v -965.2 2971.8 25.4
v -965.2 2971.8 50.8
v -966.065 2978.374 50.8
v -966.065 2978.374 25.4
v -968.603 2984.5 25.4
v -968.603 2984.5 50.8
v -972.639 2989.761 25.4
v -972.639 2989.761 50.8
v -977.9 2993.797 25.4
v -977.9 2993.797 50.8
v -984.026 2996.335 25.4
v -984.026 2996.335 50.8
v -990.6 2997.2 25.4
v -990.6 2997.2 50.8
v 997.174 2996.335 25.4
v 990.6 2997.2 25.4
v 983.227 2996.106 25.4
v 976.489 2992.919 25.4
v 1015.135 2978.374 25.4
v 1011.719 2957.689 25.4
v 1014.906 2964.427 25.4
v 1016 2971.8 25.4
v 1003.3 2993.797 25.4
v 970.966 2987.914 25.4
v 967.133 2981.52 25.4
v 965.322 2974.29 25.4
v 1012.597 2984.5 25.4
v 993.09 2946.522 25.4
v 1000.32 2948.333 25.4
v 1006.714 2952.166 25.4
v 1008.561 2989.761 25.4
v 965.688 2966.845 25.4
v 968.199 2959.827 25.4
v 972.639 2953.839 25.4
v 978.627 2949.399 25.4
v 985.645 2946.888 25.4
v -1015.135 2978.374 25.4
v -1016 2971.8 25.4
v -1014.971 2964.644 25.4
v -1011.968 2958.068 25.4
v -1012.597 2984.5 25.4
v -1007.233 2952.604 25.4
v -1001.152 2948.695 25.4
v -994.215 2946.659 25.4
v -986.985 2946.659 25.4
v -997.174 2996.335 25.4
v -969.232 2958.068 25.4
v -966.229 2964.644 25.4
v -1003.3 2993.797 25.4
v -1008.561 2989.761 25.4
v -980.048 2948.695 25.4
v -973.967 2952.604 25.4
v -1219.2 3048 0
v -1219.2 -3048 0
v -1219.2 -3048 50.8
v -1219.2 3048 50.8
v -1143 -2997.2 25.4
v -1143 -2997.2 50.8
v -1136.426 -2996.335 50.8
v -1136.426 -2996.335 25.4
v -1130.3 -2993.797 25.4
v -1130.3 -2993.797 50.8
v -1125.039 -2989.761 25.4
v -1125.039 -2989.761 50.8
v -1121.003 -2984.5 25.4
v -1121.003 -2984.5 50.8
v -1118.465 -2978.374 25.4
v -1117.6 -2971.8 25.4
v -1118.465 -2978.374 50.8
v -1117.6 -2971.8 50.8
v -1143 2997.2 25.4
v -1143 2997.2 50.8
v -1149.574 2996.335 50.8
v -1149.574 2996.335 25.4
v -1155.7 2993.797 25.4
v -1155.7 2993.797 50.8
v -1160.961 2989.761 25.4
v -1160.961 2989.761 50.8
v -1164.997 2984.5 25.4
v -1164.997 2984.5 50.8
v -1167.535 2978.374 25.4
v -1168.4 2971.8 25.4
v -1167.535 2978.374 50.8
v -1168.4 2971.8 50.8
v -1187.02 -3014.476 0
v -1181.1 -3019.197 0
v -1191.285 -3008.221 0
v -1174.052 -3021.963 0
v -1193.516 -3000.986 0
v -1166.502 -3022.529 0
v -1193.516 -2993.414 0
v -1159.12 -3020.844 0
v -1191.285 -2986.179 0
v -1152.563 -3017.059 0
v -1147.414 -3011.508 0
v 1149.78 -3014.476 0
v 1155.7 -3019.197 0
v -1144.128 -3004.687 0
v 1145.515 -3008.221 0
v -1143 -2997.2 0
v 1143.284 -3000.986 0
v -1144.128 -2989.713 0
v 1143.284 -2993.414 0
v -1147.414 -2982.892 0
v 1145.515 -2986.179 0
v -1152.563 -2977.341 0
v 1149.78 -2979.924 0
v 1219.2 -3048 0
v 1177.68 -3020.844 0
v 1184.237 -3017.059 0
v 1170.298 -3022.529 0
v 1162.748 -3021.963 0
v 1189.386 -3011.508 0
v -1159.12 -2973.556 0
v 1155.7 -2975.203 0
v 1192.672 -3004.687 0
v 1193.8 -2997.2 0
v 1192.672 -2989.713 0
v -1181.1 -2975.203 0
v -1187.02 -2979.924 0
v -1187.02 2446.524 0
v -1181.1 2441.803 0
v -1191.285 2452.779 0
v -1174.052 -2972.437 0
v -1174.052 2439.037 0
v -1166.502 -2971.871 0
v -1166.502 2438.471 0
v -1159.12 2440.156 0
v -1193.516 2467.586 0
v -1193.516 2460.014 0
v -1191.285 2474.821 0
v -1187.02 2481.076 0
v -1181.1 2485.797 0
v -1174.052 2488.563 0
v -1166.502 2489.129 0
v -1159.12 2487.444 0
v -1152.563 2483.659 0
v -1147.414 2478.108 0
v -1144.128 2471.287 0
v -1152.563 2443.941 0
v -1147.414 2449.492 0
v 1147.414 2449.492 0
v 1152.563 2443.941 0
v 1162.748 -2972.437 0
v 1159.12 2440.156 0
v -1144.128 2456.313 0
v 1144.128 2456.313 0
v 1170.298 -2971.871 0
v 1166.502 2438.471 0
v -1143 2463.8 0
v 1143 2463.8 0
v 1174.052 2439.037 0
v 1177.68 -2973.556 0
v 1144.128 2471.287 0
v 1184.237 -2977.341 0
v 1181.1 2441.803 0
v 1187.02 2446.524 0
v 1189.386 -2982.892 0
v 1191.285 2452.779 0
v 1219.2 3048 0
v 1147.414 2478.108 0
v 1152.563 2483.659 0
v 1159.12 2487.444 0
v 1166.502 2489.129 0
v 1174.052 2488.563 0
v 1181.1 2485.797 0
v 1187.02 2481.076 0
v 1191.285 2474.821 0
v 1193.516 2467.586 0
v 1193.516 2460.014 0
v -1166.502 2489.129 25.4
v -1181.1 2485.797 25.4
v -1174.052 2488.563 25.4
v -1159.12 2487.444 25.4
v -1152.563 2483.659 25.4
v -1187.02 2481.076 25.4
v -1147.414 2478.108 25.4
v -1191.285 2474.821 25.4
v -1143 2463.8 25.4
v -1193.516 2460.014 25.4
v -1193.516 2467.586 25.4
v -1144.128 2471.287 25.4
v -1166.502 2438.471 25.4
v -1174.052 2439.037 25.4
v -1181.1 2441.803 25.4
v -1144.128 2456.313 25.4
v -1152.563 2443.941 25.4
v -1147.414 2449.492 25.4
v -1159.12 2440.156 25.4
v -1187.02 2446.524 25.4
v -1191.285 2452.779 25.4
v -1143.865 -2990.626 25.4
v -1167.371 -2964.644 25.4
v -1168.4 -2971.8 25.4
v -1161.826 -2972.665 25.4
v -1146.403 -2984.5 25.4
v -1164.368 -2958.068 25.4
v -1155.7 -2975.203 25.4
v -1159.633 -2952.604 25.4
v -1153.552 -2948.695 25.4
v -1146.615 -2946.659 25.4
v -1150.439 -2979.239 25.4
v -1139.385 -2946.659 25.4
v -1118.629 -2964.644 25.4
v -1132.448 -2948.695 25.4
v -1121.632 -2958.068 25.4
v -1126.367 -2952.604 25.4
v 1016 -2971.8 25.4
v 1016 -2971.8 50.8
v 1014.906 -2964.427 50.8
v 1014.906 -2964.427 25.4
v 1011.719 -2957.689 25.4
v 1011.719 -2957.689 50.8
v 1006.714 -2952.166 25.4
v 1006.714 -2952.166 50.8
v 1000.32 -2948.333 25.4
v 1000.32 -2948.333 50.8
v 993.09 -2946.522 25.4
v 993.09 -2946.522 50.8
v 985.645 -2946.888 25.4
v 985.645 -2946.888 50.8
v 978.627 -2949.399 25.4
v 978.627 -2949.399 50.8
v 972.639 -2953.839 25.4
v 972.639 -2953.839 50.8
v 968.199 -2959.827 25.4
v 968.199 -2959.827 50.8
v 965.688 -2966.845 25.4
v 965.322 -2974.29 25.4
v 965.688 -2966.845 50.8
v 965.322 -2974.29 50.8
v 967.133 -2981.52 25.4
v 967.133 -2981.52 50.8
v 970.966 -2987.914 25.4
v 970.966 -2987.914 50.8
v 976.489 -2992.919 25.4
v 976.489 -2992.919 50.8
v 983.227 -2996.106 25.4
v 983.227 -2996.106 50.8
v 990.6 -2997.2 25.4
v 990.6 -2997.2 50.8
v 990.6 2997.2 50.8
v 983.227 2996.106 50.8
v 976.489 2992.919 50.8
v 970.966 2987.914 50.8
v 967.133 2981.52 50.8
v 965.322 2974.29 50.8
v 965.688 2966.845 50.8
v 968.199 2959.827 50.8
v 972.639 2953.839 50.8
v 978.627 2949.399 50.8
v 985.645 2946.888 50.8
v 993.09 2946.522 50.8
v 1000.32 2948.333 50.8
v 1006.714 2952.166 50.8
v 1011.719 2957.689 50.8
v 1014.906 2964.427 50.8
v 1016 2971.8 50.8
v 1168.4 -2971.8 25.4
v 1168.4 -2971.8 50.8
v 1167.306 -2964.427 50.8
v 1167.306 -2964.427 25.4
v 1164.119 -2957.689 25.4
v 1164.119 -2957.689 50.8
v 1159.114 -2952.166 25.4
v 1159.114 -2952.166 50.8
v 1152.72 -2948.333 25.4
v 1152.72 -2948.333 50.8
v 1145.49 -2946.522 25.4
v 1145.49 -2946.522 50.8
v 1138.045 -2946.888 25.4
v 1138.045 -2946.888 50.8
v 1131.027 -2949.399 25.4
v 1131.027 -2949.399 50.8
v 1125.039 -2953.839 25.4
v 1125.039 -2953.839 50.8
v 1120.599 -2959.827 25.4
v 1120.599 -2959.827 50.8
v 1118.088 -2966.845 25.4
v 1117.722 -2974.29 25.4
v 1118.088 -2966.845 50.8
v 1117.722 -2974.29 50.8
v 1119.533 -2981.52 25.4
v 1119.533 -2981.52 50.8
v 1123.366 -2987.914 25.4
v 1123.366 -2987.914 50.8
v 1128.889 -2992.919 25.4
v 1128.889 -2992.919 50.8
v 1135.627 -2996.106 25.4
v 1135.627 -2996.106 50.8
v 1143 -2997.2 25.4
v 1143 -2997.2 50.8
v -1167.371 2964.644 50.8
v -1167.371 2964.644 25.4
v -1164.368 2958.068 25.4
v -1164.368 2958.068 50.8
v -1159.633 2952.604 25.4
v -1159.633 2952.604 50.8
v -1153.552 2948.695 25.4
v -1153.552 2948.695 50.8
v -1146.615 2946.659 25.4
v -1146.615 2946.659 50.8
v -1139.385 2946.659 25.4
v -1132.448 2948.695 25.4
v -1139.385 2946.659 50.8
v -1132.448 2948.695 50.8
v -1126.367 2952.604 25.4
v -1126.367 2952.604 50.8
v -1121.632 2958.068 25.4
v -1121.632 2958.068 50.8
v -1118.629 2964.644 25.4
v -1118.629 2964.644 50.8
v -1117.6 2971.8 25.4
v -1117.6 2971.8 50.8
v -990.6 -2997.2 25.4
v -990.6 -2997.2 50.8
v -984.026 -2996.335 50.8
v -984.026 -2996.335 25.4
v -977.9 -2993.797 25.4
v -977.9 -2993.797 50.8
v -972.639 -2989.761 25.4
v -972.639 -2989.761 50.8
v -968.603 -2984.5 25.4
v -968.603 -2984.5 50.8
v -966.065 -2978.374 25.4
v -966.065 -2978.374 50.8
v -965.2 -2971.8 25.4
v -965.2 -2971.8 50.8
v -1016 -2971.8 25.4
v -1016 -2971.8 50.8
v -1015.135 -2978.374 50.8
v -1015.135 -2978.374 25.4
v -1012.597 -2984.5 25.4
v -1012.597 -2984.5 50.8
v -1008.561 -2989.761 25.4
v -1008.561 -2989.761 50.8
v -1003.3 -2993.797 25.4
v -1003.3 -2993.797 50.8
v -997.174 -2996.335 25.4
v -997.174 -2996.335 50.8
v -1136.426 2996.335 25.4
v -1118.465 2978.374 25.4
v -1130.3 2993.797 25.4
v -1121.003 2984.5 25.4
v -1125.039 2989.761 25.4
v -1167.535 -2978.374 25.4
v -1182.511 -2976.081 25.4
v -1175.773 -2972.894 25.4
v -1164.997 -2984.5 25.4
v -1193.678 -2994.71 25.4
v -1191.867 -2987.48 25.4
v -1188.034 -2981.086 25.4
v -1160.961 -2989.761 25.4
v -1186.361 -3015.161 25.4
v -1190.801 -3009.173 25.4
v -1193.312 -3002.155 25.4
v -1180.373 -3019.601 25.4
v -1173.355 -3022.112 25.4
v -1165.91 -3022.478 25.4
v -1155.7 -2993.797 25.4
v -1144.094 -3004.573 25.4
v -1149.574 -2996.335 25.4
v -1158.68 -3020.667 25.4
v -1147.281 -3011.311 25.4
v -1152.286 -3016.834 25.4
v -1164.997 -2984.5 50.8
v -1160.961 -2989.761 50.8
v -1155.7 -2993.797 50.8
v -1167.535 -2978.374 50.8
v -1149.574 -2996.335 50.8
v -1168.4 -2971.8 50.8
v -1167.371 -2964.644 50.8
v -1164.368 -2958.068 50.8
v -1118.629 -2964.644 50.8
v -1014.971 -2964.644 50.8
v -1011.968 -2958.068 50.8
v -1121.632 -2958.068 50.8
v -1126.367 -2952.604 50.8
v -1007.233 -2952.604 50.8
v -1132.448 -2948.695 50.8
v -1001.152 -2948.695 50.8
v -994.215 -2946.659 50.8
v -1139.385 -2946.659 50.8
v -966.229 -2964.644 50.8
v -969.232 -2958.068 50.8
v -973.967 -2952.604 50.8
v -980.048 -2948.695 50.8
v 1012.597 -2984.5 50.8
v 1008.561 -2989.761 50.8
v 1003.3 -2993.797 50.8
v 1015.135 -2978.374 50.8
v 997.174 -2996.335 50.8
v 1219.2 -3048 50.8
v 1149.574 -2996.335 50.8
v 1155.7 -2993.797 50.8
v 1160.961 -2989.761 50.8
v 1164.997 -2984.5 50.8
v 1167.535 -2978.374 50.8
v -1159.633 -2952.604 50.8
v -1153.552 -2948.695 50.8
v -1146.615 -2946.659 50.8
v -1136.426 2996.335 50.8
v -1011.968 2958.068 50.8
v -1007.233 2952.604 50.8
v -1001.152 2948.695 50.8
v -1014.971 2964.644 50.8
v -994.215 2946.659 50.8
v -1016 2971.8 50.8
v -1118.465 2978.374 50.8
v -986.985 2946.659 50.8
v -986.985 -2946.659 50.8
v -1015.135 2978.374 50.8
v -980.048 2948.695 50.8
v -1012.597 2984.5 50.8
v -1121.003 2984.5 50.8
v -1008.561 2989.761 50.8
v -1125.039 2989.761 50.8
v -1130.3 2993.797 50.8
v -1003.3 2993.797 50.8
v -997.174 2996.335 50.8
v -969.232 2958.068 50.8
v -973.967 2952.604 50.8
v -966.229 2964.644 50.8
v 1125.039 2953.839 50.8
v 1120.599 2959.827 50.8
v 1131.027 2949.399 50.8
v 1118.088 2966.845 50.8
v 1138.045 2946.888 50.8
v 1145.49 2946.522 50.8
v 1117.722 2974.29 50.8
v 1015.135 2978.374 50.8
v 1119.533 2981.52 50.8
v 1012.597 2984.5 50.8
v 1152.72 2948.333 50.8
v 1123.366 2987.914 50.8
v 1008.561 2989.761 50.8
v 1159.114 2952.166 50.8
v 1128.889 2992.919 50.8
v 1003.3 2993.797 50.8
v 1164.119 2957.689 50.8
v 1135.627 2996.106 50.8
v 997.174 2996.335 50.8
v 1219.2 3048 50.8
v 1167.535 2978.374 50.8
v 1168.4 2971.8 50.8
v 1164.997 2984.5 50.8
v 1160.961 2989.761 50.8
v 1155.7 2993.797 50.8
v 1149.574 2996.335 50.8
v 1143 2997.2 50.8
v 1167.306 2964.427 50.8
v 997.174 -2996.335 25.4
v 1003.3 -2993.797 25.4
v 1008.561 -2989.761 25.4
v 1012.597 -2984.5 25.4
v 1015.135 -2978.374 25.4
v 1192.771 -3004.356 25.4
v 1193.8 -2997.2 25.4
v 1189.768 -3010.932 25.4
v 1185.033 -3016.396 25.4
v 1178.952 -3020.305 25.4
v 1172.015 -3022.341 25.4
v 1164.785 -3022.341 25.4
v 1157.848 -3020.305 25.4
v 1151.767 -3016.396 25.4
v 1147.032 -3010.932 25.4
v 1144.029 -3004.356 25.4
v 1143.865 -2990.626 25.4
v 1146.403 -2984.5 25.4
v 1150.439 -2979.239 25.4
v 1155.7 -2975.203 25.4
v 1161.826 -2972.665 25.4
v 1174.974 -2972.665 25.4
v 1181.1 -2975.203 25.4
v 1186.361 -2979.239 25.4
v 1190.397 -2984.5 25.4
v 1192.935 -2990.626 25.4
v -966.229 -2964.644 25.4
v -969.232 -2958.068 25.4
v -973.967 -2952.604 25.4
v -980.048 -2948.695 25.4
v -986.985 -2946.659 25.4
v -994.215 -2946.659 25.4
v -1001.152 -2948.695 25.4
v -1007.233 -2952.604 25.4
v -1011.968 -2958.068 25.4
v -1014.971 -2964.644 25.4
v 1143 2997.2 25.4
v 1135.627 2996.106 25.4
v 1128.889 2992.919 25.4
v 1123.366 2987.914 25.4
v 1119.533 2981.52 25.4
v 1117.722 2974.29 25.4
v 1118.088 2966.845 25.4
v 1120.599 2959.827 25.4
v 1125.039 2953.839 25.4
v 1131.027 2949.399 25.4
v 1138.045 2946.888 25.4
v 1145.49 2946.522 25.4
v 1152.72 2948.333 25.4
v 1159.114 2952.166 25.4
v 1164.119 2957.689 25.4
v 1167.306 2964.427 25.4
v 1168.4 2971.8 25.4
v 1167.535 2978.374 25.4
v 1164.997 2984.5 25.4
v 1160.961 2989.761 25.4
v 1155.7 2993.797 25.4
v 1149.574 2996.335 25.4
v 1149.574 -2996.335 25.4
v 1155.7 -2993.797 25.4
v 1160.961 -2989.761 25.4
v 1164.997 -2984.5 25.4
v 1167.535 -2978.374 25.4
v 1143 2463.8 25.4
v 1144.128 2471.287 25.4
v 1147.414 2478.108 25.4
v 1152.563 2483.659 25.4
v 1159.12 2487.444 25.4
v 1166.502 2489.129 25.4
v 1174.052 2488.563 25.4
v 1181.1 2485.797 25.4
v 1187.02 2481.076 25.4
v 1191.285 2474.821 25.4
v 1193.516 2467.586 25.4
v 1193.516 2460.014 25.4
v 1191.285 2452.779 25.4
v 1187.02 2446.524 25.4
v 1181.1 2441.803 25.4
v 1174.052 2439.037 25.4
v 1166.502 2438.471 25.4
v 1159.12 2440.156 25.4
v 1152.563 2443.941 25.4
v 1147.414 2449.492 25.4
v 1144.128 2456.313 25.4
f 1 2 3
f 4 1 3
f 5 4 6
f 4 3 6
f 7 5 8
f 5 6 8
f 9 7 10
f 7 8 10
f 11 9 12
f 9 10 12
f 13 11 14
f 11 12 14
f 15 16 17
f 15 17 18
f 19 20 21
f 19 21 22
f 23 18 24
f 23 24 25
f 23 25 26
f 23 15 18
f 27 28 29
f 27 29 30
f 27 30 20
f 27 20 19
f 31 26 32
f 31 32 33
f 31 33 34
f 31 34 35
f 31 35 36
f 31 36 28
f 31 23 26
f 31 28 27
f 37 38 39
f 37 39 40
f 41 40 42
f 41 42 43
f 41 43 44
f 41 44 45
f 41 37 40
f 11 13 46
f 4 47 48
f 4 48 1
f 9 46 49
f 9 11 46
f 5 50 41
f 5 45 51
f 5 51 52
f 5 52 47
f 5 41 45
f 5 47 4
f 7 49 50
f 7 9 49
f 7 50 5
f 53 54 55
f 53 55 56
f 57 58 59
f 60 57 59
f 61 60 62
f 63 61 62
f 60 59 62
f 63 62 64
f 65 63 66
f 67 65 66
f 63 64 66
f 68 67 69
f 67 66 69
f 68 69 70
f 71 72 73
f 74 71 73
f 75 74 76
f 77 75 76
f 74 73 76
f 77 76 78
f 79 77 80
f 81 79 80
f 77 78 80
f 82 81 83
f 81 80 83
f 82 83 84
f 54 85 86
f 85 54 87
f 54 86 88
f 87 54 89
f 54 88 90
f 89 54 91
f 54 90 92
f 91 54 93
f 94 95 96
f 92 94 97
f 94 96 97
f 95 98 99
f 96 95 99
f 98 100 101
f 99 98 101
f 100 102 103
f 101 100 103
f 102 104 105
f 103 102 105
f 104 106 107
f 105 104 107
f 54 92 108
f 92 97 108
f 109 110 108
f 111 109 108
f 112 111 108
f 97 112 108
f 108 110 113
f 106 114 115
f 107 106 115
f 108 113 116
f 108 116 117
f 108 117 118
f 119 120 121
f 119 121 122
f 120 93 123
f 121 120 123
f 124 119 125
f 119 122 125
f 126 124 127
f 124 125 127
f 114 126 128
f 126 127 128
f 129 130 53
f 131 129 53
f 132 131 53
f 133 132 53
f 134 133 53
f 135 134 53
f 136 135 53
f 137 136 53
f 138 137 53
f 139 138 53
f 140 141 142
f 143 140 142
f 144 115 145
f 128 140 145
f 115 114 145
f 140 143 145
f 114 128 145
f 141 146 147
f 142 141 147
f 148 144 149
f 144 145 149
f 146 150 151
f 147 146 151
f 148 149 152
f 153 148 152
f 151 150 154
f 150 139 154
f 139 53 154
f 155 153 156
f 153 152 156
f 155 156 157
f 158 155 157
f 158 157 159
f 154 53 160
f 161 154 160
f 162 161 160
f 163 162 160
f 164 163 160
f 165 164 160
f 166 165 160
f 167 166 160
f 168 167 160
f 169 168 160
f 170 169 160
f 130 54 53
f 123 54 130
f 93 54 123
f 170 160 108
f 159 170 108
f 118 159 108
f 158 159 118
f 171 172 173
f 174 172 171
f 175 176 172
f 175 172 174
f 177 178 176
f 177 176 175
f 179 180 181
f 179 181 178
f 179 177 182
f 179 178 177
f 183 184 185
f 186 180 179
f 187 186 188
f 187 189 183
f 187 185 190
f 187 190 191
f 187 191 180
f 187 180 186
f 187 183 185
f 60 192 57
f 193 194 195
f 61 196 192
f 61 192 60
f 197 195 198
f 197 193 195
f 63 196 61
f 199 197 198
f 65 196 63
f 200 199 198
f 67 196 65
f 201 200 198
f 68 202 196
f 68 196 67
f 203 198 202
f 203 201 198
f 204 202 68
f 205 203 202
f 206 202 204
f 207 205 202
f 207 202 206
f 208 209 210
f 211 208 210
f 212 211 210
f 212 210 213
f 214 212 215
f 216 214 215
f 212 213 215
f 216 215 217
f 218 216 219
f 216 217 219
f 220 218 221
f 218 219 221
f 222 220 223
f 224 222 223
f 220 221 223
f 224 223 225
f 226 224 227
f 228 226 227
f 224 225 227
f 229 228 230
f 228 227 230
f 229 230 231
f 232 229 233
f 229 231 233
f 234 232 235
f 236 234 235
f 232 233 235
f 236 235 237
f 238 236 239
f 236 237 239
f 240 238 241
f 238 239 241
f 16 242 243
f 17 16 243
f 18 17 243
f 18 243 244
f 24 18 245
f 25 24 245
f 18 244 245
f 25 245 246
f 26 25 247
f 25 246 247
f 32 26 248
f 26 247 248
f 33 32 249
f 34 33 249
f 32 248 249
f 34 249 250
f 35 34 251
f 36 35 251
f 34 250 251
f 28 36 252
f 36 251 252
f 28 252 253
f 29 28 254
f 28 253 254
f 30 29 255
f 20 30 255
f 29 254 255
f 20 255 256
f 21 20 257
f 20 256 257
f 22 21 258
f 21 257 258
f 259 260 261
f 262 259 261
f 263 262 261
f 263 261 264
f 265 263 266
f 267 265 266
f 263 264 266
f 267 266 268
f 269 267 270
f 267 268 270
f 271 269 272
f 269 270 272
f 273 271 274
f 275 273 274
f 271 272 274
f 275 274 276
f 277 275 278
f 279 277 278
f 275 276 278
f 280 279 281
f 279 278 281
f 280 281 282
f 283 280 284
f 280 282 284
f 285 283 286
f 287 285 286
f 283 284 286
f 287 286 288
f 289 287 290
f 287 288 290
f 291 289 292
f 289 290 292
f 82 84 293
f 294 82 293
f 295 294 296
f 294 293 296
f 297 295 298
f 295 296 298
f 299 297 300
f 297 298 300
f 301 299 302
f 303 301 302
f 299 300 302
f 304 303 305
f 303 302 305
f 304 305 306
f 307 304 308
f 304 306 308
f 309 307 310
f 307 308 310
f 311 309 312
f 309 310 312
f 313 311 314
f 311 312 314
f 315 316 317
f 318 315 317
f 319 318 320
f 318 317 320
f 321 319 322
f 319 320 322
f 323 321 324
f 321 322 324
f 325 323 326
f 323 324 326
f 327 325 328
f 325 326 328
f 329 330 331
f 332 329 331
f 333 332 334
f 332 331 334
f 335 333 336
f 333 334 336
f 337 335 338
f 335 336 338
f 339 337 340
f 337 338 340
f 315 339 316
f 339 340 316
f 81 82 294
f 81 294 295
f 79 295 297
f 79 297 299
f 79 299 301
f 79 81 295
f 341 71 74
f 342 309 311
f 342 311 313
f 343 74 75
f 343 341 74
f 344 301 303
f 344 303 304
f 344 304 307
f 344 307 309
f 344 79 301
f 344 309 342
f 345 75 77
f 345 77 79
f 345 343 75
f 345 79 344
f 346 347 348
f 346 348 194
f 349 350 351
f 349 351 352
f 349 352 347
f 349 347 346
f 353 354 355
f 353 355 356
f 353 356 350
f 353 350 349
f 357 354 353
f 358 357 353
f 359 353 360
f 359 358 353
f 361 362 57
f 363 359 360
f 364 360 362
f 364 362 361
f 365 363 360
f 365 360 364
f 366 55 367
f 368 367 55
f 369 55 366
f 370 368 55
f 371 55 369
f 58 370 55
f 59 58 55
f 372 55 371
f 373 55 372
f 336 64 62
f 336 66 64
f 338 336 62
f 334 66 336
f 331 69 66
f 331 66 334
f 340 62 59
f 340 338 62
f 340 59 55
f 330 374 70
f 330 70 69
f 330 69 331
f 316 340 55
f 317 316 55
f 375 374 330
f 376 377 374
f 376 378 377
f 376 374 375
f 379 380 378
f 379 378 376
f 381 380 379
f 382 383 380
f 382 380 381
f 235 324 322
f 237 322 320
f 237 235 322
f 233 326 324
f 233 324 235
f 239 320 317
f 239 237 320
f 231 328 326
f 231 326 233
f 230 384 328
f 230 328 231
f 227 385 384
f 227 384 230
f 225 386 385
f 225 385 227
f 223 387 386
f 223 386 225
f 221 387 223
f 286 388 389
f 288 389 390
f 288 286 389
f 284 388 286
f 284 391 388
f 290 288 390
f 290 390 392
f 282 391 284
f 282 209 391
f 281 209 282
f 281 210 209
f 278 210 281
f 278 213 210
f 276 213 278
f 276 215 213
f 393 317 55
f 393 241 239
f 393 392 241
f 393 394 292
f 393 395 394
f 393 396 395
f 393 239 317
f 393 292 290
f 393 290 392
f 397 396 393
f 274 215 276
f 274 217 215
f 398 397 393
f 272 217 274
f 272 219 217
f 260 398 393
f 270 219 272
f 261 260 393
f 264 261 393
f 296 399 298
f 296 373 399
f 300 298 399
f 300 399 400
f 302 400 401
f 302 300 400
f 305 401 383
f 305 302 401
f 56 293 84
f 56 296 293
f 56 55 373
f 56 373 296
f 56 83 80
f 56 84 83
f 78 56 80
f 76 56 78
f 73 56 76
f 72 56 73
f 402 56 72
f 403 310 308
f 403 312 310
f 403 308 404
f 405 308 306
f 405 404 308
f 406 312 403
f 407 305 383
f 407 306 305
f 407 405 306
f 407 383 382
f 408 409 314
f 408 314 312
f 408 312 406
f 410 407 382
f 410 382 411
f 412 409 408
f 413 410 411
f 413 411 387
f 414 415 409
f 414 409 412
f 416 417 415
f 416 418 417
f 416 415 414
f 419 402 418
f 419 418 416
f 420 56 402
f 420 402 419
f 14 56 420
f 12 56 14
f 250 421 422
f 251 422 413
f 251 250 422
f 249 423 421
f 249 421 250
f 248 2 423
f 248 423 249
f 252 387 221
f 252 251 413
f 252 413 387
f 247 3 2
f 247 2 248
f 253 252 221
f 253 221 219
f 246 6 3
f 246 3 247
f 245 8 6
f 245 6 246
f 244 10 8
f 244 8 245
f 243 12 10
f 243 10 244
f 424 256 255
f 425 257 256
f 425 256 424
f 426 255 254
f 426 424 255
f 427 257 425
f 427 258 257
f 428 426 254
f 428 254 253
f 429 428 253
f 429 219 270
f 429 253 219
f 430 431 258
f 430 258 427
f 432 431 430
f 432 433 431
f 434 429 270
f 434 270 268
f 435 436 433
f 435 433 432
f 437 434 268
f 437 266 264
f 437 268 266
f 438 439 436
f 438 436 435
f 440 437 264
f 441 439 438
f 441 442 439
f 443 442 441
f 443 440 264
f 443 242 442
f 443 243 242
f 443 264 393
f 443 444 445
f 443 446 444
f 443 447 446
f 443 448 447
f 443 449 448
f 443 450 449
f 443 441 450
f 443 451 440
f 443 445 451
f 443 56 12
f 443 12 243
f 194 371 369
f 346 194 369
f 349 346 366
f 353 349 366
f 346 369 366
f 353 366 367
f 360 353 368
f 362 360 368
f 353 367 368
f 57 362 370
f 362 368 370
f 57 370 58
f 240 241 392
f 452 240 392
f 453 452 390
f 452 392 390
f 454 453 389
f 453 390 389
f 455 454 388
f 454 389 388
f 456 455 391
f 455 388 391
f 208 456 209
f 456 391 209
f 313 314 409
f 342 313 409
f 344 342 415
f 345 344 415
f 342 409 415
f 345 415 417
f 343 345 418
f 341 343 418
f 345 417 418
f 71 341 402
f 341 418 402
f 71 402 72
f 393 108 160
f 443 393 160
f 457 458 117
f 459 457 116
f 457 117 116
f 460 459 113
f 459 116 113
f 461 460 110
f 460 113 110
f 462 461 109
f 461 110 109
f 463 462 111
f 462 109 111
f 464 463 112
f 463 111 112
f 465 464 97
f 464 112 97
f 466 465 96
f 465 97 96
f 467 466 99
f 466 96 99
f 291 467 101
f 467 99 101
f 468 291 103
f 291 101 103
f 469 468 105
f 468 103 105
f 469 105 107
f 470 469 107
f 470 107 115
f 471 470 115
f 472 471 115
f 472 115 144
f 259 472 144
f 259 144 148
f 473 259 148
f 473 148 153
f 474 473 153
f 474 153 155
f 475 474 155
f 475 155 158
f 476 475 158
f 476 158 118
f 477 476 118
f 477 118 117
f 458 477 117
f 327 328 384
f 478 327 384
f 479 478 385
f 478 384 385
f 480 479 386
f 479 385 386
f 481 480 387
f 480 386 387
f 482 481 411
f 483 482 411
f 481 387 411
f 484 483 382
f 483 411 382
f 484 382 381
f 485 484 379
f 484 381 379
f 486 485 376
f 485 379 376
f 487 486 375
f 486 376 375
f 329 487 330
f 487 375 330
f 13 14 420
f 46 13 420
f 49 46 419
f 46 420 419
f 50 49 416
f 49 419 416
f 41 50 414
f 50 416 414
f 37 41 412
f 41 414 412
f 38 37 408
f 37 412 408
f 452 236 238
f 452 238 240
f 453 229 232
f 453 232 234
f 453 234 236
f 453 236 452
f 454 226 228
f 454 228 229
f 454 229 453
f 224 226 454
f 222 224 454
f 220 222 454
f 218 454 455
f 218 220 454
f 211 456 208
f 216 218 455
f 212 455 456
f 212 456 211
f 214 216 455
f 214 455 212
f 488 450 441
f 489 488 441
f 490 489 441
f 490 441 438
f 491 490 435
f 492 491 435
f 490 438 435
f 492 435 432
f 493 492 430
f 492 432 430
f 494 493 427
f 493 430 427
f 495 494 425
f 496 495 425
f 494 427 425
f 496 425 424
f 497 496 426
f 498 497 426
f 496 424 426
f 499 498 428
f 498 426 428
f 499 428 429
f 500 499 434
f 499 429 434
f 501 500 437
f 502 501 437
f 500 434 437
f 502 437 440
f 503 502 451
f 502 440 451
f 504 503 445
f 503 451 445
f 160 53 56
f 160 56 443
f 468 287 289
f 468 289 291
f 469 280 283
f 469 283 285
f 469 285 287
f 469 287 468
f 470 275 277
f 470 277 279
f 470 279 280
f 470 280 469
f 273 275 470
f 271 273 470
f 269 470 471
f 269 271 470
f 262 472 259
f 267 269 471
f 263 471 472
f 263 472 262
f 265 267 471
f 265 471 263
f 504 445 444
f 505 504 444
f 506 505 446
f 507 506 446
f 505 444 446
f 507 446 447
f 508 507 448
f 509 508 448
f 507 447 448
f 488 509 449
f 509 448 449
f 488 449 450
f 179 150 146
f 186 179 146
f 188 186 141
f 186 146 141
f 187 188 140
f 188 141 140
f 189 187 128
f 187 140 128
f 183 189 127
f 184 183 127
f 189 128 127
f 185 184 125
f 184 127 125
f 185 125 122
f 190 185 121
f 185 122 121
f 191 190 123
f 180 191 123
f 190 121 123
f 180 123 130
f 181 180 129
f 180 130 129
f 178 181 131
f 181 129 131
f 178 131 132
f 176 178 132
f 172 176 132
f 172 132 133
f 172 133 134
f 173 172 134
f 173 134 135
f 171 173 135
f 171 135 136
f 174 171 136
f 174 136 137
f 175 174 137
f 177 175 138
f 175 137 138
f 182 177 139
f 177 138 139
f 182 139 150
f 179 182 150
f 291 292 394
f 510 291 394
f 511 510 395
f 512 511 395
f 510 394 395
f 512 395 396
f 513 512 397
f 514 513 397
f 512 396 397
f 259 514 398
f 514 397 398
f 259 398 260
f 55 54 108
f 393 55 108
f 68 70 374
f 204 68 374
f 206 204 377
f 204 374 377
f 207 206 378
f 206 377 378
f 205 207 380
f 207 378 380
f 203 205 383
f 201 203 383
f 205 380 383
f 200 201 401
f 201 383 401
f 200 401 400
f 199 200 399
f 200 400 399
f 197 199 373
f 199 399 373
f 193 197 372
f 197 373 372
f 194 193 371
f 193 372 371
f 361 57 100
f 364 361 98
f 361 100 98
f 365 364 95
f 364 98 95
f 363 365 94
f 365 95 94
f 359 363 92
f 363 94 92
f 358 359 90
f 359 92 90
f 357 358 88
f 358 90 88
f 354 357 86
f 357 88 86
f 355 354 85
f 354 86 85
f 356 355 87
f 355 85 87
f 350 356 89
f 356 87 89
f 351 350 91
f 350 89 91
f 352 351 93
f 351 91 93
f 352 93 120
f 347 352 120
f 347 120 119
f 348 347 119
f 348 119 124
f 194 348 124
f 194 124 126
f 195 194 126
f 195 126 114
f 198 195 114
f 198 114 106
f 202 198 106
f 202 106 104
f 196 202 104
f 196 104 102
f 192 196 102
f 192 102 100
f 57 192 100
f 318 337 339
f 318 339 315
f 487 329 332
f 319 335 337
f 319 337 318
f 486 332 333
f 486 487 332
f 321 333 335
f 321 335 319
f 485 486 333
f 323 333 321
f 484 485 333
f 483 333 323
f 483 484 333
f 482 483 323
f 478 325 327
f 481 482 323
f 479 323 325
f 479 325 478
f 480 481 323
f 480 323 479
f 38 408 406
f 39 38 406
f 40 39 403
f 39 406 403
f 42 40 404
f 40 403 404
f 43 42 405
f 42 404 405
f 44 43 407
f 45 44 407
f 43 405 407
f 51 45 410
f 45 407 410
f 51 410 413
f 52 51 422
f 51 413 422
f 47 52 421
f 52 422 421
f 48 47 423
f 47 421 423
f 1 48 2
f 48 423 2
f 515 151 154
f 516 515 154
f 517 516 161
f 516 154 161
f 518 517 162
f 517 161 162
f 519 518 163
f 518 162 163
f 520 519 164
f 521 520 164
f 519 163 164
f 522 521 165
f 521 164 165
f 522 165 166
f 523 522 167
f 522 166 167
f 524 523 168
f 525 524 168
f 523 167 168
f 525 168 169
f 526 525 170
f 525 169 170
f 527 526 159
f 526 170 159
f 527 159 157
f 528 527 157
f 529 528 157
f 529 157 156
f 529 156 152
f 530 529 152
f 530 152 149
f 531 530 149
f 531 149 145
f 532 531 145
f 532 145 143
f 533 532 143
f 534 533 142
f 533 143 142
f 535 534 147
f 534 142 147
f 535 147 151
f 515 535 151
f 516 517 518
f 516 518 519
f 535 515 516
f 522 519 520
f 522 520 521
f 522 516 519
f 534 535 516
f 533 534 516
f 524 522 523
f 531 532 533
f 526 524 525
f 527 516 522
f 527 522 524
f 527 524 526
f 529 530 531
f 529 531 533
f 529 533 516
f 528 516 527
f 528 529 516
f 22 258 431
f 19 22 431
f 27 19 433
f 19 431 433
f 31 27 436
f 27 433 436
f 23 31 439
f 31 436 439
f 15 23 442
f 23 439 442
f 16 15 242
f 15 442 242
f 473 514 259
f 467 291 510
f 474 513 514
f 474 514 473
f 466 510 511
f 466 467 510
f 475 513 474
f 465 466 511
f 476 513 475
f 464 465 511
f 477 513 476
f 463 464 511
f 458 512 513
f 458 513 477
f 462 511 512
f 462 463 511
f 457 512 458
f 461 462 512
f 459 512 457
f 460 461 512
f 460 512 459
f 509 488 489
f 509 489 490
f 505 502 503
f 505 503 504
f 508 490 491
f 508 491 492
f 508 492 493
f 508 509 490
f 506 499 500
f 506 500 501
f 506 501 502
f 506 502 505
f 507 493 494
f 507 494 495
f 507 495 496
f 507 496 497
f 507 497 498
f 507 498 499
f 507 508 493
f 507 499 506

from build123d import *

# Parameters (mm, degrees)
F0_W     = 2438.4
F0_H     = 6096
F1_DEPTH = 50.8
F3_DEPTH = 25.4
F5_DEPTH = 25.4
F6_R     = 25.4
F7_DEPTH = 25.4
F8_DEPTH = 25.4
F9_DEPTH = 25.4


with BuildPart() as f1:
    # F0 (on Top) → F1 (new body)
    with BuildSketch(Plane.XY):
        Rectangle(F0_W, F0_H)
    extrude(amount=F1_DEPTH)

    # F2 (on face) → F3 (cut)
    with BuildSketch(Plane.XY.offset(50.8)):
        with BuildLine():
            Line((1143, 2971.8), (1168.4, 2971.8))
            ThreePointArc((1168.4, 2971.8), (1160.960512, 2989.760512), (1143, 2997.2))
            Line((1143, 2997.2), (1143, 2971.8))
        make_face()
        with BuildLine():
            ThreePointArc((1143, 2997.2), (1125.039488, 2953.839488), (1168.4, 2971.8))
            Line((1168.4, 2971.8), (1143, 2971.8))
            Line((1143, 2971.8), (1143, 2997.2))
        make_face()
        with BuildLine():
            Line((1143, -2971.8), (1143, -2997.2))
            ThreePointArc((1143, -2997.2), (1160.960512, -2989.760512), (1168.4, -2971.8))
            Line((1168.4, -2971.8), (1143, -2971.8))
        make_face()
        with BuildLine():
            ThreePointArc((1168.4, -2971.8), (1125.039488, -2953.839488), (1143, -2997.2))
            Line((1143, -2997.2), (1143, -2971.8))
            Line((1143, -2971.8), (1168.4, -2971.8))
        make_face()
        with BuildLine():
            ThreePointArc((-1168.4, -2971.8), (-1160.960512, -2989.760512), (-1143, -2997.2))
            Line((-1143, -2997.2), (-1143, -2971.8))
            Line((-1143, -2971.8), (-1168.4, -2971.8))
        make_face()
        with BuildLine():
            Line((-1143, -2971.8), (-1143, -2997.2))
            ThreePointArc((-1143, -2997.2), (-1125.039488, -2989.760512), (-1117.6, -2971.8))
            ThreePointArc((-1117.6, -2971.8), (-1143, -2946.4), (-1168.4, -2971.8))
            Line((-1168.4, -2971.8), (-1143, -2971.8))
        make_face()
        with BuildLine():
            ThreePointArc((-1143, 2997.2), (-1160.960512, 2989.760512), (-1168.4, 2971.8))
            Line((-1168.4, 2971.8), (-1143, 2971.8))
            Line((-1143, 2971.8), (-1143, 2997.2))
        make_face()
        with BuildLine():
            Line((-1143, 2971.8), (-1168.4, 2971.8))
            ThreePointArc((-1168.4, 2971.8), (-1143, 2946.4), (-1117.6, 2971.8))
            ThreePointArc((-1117.6, 2971.8), (-1125.039488, 2989.760512), (-1143, 2997.2))
            Line((-1143, 2997.2), (-1143, 2971.8))
        make_face()
    extrude(amount=-F3_DEPTH, mode=Mode.SUBTRACT)

    # F4 (on face) → F5 (cut)
    with BuildSketch(Plane.XY.offset(50.8)):
        with BuildLine():
            ThreePointArc((1016, -2971.8), (972.639488, -2953.839488), (990.6, -2997.2))
            Line((990.6, -2997.2), (990.6, -2971.8))
            Line((990.6, -2971.8), (1016, -2971.8))
        make_face()
        with BuildLine():
            Line((990.6, -2971.8), (990.6, -2997.2))
            ThreePointArc((990.6, -2997.2), (1008.560512, -2989.760512), (1016, -2971.8))
            Line((1016, -2971.8), (990.6, -2971.8))
        make_face()
        with BuildLine():
            Line((-990.6, -2971.8), (-1016, -2971.8))
            ThreePointArc((-1016, -2971.8), (-1008.560512, -2989.760512), (-990.6, -2997.2))
            Line((-990.6, -2997.2), (-990.6, -2971.8))
        make_face()
        with BuildLine():
            ThreePointArc((-965.2, -2971.8), (-990.6, -2946.4), (-1016, -2971.8))
            Line((-1016, -2971.8), (-990.6, -2971.8))
            Line((-990.6, -2971.8), (-990.6, -2997.2))
            ThreePointArc((-990.6, -2997.2), (-972.639488, -2989.760512), (-965.2, -2971.8))
        make_face()
        with BuildLine():
            ThreePointArc((1016, 2971.8), (1008.560512, 2989.760512), (990.6, 2997.2))
            Line((990.6, 2997.2), (990.6, 2971.8))
            Line((990.6, 2971.8), (1016, 2971.8))
        make_face()
        with BuildLine():
            Line((990.6, 2971.8), (990.6, 2997.2))
            ThreePointArc((990.6, 2997.2), (972.639488, 2953.839488), (1016, 2971.8))
            Line((1016, 2971.8), (990.6, 2971.8))
        make_face()
        with BuildLine():
            Line((-990.6, 2971.8), (-990.6, 2997.2))
            ThreePointArc((-990.6, 2997.2), (-1008.560512, 2989.760512), (-1016, 2971.8))
            Line((-1016, 2971.8), (-990.6, 2971.8))
        make_face()
        with BuildLine():
            ThreePointArc((-965.2, 2971.8), (-972.639488, 2989.760512), (-990.6, 2997.2))
            Line((-990.6, 2997.2), (-990.6, 2971.8))
            Line((-990.6, 2971.8), (-1016, 2971.8))
            ThreePointArc((-1016, 2971.8), (-990.6, 2946.4), (-965.2, 2971.8))
        make_face()
    extrude(amount=-F5_DEPTH, mode=Mode.SUBTRACT)

    # F6 (on face) → F7 (cut)
    with BuildSketch(Plane(origin=(0, 0, 0), x_dir=(1, 0, 0), z_dir=(0, 0, -1))):
        with Locations((-1168.4, -2463.8)):
            Circle(F6_R)
    extrude(amount=-F7_DEPTH, mode=Mode.SUBTRACT)

    # F6 (on face) → F8 (cut)
    with BuildSketch(Plane(origin=(0, 0, 0), x_dir=(1, 0, 0), z_dir=(0, 0, -1))):
        with Locations((-1168.4, -2463.8)):
            Circle(F6_R)
        with BuildLine():
            ThreePointArc((1193.8, -2463.8), (1168.4, -2438.4), (1143, -2463.8))
            ThreePointArc((1143, -2463.8), (1168.4, -2489.2), (1193.8, -2463.8))
        make_face()
        with Locations((-1168.4, 2997.2)):
            Circle(F6_R)
        with Locations((1168.4, 2997.2)):
            Circle(F6_R)
    extrude(amount=-F8_DEPTH, mode=Mode.SUBTRACT)

    # F6 (on face) → F9 (cut)
    with BuildSketch(Plane(origin=(0, 0, 0), x_dir=(1, 0, 0), z_dir=(0, 0, -1))):
        with Locations((-1168.4, -2463.8)):
            Circle(F6_R)
        with BuildLine():
            ThreePointArc((1193.8, -2463.8), (1168.4, -2438.4), (1143, -2463.8))
            ThreePointArc((1143, -2463.8), (1168.4, -2489.2), (1193.8, -2463.8))
        make_face()
        with Locations((-1168.4, 2997.2)):
            Circle(F6_R)
        with Locations((1168.4, 2997.2)):
            Circle(F6_R)
    extrude(amount=-F9_DEPTH, mode=Mode.SUBTRACT)


solid = f1.part
